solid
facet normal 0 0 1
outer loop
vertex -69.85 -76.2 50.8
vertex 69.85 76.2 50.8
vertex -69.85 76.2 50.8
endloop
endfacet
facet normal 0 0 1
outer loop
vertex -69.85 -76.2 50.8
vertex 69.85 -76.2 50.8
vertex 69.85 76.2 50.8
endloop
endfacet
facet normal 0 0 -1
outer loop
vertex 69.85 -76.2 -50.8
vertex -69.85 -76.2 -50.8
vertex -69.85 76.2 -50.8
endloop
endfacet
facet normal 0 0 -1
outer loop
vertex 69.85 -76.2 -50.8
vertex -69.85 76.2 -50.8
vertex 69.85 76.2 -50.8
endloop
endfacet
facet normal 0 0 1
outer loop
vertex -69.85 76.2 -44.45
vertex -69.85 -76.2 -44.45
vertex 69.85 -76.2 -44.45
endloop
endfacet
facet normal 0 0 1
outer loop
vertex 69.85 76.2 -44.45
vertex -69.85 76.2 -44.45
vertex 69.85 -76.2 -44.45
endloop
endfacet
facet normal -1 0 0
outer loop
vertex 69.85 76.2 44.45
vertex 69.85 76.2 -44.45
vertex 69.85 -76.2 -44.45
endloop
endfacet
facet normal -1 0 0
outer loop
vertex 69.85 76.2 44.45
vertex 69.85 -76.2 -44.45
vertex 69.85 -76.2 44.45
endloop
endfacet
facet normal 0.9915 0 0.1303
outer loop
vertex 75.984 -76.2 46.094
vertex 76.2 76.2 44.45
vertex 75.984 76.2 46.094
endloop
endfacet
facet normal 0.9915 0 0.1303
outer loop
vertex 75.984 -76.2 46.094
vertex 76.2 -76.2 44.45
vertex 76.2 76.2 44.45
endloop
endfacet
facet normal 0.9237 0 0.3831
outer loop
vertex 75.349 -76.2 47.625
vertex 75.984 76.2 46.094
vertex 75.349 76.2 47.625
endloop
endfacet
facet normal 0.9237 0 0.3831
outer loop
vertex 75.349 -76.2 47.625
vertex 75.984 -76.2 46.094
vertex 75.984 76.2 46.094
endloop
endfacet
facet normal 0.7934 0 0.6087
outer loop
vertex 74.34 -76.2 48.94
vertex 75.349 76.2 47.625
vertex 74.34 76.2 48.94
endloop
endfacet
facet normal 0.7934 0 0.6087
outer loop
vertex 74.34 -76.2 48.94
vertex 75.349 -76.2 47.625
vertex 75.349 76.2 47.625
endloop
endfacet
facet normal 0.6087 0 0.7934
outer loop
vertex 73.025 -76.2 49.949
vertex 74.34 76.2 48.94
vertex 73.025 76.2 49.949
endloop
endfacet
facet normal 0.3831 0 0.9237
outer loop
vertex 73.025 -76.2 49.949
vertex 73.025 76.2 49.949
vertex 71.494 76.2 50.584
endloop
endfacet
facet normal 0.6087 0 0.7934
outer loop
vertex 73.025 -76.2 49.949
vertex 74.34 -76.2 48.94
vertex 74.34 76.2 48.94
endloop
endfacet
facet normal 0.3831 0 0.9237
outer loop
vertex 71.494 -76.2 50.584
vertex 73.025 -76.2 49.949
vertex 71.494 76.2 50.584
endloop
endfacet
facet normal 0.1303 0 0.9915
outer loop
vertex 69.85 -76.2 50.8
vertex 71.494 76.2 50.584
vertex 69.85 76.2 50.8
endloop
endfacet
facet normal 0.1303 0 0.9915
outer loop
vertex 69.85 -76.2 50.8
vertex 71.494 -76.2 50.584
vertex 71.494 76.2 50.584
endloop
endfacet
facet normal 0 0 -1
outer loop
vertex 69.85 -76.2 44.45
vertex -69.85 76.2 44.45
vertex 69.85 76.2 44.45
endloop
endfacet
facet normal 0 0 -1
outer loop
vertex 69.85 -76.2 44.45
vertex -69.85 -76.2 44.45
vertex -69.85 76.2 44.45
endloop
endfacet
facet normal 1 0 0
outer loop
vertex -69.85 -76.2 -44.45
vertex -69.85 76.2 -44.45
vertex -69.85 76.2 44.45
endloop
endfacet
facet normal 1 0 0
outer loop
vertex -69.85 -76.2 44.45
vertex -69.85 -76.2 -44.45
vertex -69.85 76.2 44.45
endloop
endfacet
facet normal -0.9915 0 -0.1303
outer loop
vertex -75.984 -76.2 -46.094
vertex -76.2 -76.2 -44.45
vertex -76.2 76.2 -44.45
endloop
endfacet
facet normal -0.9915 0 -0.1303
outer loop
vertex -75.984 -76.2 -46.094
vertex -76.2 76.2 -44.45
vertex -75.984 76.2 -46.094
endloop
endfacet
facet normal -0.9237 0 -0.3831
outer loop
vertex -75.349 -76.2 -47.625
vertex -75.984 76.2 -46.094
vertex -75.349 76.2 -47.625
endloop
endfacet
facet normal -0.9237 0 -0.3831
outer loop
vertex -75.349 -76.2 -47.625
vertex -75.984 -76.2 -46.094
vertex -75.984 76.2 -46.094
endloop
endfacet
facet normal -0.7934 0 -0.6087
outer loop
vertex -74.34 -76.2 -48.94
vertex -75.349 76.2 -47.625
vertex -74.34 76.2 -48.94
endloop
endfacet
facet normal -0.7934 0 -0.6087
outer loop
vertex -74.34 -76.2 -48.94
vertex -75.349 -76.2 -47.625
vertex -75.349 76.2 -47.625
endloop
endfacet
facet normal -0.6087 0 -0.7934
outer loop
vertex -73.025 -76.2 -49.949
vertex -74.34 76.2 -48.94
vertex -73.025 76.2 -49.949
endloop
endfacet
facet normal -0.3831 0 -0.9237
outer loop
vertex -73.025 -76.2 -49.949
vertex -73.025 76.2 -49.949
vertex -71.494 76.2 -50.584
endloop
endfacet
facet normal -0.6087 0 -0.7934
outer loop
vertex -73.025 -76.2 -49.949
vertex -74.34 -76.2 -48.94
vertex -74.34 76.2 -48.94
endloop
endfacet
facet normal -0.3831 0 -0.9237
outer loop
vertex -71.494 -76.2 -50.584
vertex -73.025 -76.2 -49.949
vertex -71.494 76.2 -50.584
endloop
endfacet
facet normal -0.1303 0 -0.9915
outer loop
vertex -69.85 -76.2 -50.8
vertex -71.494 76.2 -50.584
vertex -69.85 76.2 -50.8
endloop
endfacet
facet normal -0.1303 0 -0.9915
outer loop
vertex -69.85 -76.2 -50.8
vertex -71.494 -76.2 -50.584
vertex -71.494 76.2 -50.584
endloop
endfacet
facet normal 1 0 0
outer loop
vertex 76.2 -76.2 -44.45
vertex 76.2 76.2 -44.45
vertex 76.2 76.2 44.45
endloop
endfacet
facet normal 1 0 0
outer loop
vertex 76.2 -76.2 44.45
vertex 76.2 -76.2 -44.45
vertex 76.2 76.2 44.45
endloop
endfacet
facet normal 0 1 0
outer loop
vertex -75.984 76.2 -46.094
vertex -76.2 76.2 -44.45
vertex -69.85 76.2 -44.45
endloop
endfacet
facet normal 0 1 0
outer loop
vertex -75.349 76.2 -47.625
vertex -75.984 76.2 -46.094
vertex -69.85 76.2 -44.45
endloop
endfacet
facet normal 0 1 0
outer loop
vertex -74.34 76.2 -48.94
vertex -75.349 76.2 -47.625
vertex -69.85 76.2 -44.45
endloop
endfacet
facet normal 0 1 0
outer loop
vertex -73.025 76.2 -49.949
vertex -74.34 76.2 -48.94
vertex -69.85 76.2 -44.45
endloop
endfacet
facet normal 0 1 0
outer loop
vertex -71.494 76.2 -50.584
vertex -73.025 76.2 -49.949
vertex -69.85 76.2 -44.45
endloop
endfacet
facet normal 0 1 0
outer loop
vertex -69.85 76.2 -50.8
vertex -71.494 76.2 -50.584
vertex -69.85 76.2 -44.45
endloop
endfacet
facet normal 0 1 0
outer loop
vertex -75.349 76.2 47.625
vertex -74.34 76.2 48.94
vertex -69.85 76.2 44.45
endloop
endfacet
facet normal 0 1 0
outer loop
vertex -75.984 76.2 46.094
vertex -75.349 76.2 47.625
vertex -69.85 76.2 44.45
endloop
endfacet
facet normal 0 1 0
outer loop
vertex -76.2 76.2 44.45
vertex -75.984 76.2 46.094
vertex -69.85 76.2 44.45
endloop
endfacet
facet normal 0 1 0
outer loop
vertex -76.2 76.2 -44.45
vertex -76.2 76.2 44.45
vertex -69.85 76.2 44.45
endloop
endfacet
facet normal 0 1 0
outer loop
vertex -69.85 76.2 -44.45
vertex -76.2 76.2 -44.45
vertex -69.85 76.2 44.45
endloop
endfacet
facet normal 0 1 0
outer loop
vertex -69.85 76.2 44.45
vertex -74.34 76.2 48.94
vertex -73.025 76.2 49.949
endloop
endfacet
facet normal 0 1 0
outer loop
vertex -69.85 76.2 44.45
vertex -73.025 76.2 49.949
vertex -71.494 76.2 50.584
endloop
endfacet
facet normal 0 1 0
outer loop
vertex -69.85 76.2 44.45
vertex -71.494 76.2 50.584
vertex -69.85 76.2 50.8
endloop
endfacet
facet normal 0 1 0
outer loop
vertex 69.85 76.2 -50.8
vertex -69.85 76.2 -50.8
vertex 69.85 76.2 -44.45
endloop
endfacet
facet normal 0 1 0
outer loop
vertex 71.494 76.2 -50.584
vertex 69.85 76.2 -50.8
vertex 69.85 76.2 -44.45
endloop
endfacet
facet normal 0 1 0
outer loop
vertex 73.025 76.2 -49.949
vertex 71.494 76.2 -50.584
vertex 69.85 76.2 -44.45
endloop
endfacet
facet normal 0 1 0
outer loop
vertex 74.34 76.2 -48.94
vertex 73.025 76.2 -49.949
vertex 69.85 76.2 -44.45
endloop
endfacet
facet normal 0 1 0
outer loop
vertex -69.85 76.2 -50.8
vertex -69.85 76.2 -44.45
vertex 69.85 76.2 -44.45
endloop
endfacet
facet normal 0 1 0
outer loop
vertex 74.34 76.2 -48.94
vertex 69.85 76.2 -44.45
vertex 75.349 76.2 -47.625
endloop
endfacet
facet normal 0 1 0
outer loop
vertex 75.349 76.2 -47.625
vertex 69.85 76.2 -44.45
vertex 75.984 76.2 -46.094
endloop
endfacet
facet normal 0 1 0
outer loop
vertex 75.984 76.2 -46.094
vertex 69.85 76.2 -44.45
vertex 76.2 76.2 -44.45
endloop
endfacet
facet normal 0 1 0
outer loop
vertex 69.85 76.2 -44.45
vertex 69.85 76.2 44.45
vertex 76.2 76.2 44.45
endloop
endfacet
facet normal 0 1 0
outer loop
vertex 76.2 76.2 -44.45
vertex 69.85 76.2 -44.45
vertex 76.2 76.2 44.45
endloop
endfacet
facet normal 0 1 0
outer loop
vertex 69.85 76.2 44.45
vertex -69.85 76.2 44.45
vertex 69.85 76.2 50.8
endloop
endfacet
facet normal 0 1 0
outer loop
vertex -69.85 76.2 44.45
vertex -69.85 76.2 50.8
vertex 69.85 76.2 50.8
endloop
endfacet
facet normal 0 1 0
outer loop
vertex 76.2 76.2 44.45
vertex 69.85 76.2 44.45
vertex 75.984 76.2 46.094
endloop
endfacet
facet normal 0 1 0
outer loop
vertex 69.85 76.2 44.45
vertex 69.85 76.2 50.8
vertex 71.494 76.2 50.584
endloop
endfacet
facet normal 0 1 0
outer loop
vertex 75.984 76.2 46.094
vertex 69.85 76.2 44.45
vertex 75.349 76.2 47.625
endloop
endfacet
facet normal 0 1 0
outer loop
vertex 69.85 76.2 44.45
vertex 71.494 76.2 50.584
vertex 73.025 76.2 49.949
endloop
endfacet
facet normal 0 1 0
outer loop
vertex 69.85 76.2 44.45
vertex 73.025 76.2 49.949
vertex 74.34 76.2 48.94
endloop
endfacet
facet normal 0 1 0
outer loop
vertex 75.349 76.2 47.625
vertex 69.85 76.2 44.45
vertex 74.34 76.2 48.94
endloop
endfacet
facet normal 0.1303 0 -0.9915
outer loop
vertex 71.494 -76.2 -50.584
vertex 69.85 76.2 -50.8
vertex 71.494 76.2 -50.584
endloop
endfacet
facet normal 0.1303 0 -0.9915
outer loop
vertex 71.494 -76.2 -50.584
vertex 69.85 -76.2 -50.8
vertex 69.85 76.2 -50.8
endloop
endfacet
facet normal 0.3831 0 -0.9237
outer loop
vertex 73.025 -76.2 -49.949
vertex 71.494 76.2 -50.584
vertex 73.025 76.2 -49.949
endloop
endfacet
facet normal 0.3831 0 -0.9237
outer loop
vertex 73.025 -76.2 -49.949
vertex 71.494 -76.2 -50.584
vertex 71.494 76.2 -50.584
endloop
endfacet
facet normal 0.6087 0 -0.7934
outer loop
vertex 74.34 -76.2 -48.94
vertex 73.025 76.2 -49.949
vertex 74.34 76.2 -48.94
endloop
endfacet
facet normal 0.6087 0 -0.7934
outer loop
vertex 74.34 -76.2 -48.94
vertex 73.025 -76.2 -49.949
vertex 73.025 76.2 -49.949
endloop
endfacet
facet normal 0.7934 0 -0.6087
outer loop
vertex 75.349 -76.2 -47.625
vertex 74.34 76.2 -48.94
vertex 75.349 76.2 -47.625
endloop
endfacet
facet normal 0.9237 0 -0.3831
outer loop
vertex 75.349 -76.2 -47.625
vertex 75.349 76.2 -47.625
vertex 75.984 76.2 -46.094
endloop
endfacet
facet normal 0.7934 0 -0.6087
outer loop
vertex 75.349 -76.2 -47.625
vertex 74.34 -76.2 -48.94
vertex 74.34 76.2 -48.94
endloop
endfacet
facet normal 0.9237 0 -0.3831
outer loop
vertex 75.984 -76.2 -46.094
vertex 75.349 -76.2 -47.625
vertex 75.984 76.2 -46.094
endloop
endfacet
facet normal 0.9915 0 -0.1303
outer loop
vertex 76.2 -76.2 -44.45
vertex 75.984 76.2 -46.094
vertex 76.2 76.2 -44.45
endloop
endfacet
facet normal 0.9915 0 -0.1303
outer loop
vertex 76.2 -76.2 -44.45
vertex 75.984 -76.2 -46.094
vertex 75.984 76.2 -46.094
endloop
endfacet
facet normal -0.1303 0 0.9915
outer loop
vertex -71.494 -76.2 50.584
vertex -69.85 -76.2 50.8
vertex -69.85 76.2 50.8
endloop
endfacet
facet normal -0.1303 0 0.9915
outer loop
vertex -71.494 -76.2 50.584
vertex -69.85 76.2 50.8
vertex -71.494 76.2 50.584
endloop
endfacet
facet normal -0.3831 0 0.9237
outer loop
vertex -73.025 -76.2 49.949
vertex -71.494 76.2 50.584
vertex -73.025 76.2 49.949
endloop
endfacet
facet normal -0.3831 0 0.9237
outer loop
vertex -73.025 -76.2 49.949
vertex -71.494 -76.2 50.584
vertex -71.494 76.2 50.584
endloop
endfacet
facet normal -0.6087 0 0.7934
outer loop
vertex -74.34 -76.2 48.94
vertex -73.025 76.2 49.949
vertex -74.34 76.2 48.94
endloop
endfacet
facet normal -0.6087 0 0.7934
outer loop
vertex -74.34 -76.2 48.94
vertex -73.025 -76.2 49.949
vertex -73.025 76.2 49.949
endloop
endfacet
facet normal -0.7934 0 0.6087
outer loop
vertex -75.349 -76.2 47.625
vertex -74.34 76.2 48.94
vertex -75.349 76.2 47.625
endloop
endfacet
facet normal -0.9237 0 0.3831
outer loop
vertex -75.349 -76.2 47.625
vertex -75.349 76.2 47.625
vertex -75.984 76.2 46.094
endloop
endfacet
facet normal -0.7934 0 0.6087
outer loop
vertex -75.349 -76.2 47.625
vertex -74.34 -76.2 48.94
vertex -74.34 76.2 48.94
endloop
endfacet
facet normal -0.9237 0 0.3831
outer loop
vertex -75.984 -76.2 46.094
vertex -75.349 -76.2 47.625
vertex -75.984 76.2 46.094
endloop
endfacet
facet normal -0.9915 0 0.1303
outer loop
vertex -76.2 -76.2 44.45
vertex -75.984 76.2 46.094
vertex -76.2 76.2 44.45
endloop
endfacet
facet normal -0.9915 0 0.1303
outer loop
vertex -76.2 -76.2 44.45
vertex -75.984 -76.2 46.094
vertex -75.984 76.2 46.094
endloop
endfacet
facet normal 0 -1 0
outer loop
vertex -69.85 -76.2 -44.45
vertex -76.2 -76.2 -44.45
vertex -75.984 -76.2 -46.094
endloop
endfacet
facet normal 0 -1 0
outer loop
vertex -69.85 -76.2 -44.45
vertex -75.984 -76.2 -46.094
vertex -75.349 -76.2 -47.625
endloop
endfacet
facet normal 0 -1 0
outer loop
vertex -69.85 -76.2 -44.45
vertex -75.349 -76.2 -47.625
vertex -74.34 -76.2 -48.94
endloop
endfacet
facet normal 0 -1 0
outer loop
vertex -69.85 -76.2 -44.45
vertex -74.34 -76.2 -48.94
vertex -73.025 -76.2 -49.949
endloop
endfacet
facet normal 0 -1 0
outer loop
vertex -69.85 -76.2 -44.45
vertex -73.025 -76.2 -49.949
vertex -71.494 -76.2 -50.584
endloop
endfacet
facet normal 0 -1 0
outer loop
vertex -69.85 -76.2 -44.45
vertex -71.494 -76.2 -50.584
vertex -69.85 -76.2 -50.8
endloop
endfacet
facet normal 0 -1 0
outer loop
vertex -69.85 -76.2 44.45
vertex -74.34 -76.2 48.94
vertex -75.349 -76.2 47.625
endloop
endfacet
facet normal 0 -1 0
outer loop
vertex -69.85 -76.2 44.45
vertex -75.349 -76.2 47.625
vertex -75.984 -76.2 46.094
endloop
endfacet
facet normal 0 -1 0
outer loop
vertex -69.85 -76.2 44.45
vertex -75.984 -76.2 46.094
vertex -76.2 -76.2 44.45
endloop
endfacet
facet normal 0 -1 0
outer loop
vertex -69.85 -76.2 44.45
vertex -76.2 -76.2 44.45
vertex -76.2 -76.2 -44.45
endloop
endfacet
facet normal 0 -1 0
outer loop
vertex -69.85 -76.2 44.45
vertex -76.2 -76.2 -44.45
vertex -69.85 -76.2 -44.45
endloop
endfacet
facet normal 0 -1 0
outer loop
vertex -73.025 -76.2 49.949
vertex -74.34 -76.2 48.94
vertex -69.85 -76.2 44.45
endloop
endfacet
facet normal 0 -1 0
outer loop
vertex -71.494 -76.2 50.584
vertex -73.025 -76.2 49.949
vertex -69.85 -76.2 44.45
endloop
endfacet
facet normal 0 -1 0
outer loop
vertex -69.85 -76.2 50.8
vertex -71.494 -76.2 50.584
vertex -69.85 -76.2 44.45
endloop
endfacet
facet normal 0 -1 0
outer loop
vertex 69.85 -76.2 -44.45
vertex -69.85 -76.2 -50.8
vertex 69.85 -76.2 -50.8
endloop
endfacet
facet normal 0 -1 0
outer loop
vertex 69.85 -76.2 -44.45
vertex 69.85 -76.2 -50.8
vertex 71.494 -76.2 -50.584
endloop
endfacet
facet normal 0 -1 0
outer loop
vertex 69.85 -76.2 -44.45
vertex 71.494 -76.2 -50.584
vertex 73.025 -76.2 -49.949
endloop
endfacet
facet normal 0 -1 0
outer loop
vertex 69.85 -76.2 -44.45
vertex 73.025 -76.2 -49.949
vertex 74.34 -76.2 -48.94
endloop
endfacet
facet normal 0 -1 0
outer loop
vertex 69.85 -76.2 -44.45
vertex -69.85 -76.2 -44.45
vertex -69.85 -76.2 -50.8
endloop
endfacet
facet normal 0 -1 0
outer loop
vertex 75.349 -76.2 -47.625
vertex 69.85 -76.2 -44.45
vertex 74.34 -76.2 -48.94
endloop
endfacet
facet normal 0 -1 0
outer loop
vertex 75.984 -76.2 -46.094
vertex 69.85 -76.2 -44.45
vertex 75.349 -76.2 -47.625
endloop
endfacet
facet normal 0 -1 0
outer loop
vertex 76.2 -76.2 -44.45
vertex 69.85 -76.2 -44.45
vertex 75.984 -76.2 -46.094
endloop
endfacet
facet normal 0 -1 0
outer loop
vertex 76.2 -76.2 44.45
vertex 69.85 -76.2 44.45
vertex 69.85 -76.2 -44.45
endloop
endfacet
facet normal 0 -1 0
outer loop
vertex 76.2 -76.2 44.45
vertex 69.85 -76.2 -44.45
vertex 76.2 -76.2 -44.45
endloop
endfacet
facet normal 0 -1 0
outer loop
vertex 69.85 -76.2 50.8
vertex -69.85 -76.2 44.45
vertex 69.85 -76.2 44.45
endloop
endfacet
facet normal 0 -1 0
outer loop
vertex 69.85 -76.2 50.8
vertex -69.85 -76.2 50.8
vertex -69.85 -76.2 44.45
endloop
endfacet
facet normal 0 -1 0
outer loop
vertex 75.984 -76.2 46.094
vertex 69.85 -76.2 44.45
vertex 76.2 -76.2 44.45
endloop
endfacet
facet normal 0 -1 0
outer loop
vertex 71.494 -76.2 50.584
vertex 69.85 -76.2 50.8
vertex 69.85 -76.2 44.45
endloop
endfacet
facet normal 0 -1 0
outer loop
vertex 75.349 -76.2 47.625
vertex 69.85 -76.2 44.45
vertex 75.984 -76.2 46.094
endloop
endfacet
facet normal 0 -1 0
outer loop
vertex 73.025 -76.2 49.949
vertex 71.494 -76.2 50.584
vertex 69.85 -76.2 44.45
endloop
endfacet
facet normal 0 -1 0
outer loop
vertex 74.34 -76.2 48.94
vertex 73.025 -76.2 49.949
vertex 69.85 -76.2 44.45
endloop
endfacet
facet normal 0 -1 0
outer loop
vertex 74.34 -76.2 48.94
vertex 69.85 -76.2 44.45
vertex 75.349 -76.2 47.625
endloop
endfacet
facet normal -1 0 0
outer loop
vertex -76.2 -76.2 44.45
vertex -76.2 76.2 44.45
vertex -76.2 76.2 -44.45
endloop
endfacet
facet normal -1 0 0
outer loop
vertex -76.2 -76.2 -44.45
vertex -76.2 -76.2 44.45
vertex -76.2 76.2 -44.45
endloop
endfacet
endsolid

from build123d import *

# Parameters (mm, degrees)
F0_W     = 139.7
F0_H     = 88.9
F1_DEPTH = 76.2


with BuildPart() as f1:
    # F0 (on Front) → F1 (new body, symmetric)
    with BuildSketch(Plane.XZ):
        with BuildLine():
            Line((69.85, 50.8), (-69.85, 50.8))
            ThreePointArc((-69.85, 50.8), (-74.340128, 48.940128), (-76.2, 44.45))
            Line((-76.2, 44.45), (-76.2, -44.45))
            ThreePointArc((-76.2, -44.45), (-74.340128, -48.940128), (-69.85, -50.8))
            Line((-69.85, -50.8), (69.85, -50.8))
            ThreePointArc((69.85, -50.8), (74.340128, -48.940128), (76.2, -44.45))
            Line((76.2, -44.45), (76.2, 44.45))
            ThreePointArc((76.2, 44.45), (74.340128, 48.940128), (69.85, 50.8))
        make_face()
        Rectangle(F0_W, F0_H, mode=Mode.SUBTRACT)
    extrude(amount=F1_DEPTH, both=True)


solid = f1.part
